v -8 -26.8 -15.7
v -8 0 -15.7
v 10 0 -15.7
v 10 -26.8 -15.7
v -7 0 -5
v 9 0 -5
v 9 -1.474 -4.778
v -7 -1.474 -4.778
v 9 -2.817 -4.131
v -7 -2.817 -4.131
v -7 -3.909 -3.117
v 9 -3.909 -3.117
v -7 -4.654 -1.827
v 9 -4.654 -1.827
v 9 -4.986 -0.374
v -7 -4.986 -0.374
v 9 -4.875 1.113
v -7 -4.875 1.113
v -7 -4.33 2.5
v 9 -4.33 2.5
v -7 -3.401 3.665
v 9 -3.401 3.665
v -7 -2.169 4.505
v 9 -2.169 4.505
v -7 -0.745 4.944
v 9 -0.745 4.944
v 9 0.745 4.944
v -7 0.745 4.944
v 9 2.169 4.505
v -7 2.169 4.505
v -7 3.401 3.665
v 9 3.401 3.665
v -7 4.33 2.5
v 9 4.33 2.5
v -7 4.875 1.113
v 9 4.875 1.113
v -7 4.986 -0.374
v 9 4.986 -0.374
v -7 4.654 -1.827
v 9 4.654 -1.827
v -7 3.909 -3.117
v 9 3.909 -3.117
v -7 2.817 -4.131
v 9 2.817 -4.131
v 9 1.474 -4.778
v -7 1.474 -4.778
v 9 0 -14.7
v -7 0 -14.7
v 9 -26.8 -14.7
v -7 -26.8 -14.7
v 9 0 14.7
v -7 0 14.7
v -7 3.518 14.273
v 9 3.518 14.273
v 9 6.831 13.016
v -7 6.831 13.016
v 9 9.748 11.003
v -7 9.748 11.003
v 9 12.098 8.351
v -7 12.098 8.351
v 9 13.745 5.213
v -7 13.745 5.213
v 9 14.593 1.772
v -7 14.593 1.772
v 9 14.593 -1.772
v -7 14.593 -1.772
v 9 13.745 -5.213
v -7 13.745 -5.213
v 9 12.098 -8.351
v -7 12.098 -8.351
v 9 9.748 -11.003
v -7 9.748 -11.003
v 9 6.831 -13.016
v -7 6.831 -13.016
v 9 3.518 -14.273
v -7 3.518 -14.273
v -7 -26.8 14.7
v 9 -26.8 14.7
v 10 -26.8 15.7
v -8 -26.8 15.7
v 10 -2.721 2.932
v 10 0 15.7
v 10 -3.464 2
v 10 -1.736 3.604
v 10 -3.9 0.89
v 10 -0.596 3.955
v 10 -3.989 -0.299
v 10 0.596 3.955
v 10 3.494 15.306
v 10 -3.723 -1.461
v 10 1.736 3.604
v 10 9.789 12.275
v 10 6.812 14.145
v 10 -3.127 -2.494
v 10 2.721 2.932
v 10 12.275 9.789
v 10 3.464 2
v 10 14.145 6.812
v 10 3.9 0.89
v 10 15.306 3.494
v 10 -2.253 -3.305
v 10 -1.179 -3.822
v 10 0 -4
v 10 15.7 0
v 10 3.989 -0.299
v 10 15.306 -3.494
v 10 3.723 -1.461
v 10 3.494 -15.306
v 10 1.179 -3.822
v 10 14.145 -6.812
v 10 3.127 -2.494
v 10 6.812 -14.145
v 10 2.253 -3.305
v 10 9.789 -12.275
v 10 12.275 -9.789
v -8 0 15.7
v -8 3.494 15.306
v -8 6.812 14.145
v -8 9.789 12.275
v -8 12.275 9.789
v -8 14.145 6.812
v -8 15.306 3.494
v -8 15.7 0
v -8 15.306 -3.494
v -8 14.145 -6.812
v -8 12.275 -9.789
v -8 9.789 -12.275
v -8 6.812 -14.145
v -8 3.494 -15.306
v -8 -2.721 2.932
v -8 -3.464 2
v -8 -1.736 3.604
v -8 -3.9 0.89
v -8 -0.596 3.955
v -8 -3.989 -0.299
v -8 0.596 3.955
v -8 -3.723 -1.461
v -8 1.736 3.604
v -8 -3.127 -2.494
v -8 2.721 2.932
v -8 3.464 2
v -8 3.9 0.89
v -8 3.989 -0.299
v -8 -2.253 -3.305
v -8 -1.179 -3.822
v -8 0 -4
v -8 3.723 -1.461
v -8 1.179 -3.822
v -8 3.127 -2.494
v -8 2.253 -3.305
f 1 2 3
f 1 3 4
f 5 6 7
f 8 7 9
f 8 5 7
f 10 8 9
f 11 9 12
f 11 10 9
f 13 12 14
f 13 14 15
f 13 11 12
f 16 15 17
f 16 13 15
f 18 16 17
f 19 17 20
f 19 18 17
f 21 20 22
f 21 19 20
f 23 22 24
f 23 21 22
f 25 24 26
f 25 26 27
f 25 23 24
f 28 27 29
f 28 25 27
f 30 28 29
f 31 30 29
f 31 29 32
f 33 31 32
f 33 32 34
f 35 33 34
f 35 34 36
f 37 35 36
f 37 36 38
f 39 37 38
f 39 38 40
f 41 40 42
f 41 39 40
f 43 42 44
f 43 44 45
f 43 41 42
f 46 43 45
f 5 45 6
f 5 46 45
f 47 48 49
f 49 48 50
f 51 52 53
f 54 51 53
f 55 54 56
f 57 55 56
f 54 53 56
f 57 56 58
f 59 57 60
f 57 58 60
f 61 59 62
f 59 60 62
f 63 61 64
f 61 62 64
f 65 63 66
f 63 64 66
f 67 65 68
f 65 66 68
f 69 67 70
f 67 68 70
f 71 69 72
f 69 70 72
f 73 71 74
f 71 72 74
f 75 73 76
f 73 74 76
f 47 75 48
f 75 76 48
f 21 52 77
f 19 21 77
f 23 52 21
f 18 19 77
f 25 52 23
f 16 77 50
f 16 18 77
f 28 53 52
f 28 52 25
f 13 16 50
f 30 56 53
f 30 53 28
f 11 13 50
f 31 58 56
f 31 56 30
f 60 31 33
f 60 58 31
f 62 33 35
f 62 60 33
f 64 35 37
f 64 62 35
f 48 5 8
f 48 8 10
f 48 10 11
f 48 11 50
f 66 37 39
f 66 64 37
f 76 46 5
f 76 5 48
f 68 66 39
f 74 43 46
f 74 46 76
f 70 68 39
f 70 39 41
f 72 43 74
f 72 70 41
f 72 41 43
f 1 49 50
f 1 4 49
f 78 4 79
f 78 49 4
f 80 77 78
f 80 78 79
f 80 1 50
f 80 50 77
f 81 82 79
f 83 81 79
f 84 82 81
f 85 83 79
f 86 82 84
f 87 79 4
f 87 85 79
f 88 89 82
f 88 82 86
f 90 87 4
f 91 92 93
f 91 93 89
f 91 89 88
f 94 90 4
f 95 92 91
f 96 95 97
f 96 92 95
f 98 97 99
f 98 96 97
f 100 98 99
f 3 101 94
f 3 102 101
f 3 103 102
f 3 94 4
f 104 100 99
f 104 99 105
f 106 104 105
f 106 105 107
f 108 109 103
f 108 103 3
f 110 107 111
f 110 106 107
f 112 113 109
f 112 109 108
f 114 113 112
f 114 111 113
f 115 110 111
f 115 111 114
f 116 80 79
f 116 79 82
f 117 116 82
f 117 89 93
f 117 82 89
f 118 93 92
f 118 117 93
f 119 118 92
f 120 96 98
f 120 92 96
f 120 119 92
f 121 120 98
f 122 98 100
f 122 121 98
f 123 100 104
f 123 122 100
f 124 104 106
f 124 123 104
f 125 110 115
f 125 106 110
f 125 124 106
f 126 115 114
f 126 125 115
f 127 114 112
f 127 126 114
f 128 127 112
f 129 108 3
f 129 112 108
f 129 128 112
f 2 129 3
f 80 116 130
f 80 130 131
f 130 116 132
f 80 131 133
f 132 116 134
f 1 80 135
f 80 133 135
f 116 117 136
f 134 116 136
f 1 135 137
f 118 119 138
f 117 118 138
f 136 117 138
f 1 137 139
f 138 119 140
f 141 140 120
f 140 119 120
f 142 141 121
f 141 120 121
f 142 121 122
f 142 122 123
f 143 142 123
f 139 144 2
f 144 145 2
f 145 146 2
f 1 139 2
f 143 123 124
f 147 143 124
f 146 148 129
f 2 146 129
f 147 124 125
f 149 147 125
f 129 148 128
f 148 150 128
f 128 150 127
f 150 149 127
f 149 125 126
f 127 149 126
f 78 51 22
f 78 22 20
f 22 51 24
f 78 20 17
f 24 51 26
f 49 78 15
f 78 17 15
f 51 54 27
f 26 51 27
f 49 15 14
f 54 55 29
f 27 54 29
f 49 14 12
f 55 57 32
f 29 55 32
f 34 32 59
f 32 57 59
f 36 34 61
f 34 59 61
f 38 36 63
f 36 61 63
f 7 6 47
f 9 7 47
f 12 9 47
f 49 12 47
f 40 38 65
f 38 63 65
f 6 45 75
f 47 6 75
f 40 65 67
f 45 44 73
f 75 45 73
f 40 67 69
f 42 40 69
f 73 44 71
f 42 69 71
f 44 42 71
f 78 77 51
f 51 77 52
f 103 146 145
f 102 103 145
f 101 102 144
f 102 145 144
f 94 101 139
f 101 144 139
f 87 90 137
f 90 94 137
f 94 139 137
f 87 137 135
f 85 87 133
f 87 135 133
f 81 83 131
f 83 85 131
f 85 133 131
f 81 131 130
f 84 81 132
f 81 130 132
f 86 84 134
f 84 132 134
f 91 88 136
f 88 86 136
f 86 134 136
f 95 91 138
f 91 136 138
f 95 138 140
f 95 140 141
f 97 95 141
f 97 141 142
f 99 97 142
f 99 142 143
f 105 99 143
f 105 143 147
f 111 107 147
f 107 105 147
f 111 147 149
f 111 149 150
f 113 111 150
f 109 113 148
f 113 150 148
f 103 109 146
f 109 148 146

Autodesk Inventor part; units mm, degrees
ref_plane "YZ Plane" through (0, 0, 0) normal (1, 0, 0) x (0, 1, 0)
ref_plane "XZ Plane" through (0, 0, 0) normal (0, 1, 0) x (-1, 0, 0)
ref_plane "Arbeitsebene1" through (0, 0, 0) normal (1, 0, 0) x (0, 0, -1)
sketch "Skizze1" plane through (0, 0, 0) normal (1, 0, 0) x (0, 0, -1)
  arc A0 (15.7, 0) -> (-15.7, 0) centre (0, 0) ccw
  line L0 (15.7, 0) -> (15.7, -26.8)
  line L1 (15.7, -26.8) -> (-15.7, -26.8)
  line L2 (-15.7, -26.8) -> (-15.7, 0)
  circle A1 centre (0, 0) radius 4
  point P0 (0, 15.7)
  dimension "d0" = 31.4
  dimension "d1" = 42.5
  dimension "d2" = 8
extrude "Extrusion1" add sketch "Skizze1" along normal blind 10 and the other way blind 8
shell "Wandung1" thickness 1 removed faces 1 at (-2, -26.8, -5.2333)
properties part number "EncoderEnclosure"
